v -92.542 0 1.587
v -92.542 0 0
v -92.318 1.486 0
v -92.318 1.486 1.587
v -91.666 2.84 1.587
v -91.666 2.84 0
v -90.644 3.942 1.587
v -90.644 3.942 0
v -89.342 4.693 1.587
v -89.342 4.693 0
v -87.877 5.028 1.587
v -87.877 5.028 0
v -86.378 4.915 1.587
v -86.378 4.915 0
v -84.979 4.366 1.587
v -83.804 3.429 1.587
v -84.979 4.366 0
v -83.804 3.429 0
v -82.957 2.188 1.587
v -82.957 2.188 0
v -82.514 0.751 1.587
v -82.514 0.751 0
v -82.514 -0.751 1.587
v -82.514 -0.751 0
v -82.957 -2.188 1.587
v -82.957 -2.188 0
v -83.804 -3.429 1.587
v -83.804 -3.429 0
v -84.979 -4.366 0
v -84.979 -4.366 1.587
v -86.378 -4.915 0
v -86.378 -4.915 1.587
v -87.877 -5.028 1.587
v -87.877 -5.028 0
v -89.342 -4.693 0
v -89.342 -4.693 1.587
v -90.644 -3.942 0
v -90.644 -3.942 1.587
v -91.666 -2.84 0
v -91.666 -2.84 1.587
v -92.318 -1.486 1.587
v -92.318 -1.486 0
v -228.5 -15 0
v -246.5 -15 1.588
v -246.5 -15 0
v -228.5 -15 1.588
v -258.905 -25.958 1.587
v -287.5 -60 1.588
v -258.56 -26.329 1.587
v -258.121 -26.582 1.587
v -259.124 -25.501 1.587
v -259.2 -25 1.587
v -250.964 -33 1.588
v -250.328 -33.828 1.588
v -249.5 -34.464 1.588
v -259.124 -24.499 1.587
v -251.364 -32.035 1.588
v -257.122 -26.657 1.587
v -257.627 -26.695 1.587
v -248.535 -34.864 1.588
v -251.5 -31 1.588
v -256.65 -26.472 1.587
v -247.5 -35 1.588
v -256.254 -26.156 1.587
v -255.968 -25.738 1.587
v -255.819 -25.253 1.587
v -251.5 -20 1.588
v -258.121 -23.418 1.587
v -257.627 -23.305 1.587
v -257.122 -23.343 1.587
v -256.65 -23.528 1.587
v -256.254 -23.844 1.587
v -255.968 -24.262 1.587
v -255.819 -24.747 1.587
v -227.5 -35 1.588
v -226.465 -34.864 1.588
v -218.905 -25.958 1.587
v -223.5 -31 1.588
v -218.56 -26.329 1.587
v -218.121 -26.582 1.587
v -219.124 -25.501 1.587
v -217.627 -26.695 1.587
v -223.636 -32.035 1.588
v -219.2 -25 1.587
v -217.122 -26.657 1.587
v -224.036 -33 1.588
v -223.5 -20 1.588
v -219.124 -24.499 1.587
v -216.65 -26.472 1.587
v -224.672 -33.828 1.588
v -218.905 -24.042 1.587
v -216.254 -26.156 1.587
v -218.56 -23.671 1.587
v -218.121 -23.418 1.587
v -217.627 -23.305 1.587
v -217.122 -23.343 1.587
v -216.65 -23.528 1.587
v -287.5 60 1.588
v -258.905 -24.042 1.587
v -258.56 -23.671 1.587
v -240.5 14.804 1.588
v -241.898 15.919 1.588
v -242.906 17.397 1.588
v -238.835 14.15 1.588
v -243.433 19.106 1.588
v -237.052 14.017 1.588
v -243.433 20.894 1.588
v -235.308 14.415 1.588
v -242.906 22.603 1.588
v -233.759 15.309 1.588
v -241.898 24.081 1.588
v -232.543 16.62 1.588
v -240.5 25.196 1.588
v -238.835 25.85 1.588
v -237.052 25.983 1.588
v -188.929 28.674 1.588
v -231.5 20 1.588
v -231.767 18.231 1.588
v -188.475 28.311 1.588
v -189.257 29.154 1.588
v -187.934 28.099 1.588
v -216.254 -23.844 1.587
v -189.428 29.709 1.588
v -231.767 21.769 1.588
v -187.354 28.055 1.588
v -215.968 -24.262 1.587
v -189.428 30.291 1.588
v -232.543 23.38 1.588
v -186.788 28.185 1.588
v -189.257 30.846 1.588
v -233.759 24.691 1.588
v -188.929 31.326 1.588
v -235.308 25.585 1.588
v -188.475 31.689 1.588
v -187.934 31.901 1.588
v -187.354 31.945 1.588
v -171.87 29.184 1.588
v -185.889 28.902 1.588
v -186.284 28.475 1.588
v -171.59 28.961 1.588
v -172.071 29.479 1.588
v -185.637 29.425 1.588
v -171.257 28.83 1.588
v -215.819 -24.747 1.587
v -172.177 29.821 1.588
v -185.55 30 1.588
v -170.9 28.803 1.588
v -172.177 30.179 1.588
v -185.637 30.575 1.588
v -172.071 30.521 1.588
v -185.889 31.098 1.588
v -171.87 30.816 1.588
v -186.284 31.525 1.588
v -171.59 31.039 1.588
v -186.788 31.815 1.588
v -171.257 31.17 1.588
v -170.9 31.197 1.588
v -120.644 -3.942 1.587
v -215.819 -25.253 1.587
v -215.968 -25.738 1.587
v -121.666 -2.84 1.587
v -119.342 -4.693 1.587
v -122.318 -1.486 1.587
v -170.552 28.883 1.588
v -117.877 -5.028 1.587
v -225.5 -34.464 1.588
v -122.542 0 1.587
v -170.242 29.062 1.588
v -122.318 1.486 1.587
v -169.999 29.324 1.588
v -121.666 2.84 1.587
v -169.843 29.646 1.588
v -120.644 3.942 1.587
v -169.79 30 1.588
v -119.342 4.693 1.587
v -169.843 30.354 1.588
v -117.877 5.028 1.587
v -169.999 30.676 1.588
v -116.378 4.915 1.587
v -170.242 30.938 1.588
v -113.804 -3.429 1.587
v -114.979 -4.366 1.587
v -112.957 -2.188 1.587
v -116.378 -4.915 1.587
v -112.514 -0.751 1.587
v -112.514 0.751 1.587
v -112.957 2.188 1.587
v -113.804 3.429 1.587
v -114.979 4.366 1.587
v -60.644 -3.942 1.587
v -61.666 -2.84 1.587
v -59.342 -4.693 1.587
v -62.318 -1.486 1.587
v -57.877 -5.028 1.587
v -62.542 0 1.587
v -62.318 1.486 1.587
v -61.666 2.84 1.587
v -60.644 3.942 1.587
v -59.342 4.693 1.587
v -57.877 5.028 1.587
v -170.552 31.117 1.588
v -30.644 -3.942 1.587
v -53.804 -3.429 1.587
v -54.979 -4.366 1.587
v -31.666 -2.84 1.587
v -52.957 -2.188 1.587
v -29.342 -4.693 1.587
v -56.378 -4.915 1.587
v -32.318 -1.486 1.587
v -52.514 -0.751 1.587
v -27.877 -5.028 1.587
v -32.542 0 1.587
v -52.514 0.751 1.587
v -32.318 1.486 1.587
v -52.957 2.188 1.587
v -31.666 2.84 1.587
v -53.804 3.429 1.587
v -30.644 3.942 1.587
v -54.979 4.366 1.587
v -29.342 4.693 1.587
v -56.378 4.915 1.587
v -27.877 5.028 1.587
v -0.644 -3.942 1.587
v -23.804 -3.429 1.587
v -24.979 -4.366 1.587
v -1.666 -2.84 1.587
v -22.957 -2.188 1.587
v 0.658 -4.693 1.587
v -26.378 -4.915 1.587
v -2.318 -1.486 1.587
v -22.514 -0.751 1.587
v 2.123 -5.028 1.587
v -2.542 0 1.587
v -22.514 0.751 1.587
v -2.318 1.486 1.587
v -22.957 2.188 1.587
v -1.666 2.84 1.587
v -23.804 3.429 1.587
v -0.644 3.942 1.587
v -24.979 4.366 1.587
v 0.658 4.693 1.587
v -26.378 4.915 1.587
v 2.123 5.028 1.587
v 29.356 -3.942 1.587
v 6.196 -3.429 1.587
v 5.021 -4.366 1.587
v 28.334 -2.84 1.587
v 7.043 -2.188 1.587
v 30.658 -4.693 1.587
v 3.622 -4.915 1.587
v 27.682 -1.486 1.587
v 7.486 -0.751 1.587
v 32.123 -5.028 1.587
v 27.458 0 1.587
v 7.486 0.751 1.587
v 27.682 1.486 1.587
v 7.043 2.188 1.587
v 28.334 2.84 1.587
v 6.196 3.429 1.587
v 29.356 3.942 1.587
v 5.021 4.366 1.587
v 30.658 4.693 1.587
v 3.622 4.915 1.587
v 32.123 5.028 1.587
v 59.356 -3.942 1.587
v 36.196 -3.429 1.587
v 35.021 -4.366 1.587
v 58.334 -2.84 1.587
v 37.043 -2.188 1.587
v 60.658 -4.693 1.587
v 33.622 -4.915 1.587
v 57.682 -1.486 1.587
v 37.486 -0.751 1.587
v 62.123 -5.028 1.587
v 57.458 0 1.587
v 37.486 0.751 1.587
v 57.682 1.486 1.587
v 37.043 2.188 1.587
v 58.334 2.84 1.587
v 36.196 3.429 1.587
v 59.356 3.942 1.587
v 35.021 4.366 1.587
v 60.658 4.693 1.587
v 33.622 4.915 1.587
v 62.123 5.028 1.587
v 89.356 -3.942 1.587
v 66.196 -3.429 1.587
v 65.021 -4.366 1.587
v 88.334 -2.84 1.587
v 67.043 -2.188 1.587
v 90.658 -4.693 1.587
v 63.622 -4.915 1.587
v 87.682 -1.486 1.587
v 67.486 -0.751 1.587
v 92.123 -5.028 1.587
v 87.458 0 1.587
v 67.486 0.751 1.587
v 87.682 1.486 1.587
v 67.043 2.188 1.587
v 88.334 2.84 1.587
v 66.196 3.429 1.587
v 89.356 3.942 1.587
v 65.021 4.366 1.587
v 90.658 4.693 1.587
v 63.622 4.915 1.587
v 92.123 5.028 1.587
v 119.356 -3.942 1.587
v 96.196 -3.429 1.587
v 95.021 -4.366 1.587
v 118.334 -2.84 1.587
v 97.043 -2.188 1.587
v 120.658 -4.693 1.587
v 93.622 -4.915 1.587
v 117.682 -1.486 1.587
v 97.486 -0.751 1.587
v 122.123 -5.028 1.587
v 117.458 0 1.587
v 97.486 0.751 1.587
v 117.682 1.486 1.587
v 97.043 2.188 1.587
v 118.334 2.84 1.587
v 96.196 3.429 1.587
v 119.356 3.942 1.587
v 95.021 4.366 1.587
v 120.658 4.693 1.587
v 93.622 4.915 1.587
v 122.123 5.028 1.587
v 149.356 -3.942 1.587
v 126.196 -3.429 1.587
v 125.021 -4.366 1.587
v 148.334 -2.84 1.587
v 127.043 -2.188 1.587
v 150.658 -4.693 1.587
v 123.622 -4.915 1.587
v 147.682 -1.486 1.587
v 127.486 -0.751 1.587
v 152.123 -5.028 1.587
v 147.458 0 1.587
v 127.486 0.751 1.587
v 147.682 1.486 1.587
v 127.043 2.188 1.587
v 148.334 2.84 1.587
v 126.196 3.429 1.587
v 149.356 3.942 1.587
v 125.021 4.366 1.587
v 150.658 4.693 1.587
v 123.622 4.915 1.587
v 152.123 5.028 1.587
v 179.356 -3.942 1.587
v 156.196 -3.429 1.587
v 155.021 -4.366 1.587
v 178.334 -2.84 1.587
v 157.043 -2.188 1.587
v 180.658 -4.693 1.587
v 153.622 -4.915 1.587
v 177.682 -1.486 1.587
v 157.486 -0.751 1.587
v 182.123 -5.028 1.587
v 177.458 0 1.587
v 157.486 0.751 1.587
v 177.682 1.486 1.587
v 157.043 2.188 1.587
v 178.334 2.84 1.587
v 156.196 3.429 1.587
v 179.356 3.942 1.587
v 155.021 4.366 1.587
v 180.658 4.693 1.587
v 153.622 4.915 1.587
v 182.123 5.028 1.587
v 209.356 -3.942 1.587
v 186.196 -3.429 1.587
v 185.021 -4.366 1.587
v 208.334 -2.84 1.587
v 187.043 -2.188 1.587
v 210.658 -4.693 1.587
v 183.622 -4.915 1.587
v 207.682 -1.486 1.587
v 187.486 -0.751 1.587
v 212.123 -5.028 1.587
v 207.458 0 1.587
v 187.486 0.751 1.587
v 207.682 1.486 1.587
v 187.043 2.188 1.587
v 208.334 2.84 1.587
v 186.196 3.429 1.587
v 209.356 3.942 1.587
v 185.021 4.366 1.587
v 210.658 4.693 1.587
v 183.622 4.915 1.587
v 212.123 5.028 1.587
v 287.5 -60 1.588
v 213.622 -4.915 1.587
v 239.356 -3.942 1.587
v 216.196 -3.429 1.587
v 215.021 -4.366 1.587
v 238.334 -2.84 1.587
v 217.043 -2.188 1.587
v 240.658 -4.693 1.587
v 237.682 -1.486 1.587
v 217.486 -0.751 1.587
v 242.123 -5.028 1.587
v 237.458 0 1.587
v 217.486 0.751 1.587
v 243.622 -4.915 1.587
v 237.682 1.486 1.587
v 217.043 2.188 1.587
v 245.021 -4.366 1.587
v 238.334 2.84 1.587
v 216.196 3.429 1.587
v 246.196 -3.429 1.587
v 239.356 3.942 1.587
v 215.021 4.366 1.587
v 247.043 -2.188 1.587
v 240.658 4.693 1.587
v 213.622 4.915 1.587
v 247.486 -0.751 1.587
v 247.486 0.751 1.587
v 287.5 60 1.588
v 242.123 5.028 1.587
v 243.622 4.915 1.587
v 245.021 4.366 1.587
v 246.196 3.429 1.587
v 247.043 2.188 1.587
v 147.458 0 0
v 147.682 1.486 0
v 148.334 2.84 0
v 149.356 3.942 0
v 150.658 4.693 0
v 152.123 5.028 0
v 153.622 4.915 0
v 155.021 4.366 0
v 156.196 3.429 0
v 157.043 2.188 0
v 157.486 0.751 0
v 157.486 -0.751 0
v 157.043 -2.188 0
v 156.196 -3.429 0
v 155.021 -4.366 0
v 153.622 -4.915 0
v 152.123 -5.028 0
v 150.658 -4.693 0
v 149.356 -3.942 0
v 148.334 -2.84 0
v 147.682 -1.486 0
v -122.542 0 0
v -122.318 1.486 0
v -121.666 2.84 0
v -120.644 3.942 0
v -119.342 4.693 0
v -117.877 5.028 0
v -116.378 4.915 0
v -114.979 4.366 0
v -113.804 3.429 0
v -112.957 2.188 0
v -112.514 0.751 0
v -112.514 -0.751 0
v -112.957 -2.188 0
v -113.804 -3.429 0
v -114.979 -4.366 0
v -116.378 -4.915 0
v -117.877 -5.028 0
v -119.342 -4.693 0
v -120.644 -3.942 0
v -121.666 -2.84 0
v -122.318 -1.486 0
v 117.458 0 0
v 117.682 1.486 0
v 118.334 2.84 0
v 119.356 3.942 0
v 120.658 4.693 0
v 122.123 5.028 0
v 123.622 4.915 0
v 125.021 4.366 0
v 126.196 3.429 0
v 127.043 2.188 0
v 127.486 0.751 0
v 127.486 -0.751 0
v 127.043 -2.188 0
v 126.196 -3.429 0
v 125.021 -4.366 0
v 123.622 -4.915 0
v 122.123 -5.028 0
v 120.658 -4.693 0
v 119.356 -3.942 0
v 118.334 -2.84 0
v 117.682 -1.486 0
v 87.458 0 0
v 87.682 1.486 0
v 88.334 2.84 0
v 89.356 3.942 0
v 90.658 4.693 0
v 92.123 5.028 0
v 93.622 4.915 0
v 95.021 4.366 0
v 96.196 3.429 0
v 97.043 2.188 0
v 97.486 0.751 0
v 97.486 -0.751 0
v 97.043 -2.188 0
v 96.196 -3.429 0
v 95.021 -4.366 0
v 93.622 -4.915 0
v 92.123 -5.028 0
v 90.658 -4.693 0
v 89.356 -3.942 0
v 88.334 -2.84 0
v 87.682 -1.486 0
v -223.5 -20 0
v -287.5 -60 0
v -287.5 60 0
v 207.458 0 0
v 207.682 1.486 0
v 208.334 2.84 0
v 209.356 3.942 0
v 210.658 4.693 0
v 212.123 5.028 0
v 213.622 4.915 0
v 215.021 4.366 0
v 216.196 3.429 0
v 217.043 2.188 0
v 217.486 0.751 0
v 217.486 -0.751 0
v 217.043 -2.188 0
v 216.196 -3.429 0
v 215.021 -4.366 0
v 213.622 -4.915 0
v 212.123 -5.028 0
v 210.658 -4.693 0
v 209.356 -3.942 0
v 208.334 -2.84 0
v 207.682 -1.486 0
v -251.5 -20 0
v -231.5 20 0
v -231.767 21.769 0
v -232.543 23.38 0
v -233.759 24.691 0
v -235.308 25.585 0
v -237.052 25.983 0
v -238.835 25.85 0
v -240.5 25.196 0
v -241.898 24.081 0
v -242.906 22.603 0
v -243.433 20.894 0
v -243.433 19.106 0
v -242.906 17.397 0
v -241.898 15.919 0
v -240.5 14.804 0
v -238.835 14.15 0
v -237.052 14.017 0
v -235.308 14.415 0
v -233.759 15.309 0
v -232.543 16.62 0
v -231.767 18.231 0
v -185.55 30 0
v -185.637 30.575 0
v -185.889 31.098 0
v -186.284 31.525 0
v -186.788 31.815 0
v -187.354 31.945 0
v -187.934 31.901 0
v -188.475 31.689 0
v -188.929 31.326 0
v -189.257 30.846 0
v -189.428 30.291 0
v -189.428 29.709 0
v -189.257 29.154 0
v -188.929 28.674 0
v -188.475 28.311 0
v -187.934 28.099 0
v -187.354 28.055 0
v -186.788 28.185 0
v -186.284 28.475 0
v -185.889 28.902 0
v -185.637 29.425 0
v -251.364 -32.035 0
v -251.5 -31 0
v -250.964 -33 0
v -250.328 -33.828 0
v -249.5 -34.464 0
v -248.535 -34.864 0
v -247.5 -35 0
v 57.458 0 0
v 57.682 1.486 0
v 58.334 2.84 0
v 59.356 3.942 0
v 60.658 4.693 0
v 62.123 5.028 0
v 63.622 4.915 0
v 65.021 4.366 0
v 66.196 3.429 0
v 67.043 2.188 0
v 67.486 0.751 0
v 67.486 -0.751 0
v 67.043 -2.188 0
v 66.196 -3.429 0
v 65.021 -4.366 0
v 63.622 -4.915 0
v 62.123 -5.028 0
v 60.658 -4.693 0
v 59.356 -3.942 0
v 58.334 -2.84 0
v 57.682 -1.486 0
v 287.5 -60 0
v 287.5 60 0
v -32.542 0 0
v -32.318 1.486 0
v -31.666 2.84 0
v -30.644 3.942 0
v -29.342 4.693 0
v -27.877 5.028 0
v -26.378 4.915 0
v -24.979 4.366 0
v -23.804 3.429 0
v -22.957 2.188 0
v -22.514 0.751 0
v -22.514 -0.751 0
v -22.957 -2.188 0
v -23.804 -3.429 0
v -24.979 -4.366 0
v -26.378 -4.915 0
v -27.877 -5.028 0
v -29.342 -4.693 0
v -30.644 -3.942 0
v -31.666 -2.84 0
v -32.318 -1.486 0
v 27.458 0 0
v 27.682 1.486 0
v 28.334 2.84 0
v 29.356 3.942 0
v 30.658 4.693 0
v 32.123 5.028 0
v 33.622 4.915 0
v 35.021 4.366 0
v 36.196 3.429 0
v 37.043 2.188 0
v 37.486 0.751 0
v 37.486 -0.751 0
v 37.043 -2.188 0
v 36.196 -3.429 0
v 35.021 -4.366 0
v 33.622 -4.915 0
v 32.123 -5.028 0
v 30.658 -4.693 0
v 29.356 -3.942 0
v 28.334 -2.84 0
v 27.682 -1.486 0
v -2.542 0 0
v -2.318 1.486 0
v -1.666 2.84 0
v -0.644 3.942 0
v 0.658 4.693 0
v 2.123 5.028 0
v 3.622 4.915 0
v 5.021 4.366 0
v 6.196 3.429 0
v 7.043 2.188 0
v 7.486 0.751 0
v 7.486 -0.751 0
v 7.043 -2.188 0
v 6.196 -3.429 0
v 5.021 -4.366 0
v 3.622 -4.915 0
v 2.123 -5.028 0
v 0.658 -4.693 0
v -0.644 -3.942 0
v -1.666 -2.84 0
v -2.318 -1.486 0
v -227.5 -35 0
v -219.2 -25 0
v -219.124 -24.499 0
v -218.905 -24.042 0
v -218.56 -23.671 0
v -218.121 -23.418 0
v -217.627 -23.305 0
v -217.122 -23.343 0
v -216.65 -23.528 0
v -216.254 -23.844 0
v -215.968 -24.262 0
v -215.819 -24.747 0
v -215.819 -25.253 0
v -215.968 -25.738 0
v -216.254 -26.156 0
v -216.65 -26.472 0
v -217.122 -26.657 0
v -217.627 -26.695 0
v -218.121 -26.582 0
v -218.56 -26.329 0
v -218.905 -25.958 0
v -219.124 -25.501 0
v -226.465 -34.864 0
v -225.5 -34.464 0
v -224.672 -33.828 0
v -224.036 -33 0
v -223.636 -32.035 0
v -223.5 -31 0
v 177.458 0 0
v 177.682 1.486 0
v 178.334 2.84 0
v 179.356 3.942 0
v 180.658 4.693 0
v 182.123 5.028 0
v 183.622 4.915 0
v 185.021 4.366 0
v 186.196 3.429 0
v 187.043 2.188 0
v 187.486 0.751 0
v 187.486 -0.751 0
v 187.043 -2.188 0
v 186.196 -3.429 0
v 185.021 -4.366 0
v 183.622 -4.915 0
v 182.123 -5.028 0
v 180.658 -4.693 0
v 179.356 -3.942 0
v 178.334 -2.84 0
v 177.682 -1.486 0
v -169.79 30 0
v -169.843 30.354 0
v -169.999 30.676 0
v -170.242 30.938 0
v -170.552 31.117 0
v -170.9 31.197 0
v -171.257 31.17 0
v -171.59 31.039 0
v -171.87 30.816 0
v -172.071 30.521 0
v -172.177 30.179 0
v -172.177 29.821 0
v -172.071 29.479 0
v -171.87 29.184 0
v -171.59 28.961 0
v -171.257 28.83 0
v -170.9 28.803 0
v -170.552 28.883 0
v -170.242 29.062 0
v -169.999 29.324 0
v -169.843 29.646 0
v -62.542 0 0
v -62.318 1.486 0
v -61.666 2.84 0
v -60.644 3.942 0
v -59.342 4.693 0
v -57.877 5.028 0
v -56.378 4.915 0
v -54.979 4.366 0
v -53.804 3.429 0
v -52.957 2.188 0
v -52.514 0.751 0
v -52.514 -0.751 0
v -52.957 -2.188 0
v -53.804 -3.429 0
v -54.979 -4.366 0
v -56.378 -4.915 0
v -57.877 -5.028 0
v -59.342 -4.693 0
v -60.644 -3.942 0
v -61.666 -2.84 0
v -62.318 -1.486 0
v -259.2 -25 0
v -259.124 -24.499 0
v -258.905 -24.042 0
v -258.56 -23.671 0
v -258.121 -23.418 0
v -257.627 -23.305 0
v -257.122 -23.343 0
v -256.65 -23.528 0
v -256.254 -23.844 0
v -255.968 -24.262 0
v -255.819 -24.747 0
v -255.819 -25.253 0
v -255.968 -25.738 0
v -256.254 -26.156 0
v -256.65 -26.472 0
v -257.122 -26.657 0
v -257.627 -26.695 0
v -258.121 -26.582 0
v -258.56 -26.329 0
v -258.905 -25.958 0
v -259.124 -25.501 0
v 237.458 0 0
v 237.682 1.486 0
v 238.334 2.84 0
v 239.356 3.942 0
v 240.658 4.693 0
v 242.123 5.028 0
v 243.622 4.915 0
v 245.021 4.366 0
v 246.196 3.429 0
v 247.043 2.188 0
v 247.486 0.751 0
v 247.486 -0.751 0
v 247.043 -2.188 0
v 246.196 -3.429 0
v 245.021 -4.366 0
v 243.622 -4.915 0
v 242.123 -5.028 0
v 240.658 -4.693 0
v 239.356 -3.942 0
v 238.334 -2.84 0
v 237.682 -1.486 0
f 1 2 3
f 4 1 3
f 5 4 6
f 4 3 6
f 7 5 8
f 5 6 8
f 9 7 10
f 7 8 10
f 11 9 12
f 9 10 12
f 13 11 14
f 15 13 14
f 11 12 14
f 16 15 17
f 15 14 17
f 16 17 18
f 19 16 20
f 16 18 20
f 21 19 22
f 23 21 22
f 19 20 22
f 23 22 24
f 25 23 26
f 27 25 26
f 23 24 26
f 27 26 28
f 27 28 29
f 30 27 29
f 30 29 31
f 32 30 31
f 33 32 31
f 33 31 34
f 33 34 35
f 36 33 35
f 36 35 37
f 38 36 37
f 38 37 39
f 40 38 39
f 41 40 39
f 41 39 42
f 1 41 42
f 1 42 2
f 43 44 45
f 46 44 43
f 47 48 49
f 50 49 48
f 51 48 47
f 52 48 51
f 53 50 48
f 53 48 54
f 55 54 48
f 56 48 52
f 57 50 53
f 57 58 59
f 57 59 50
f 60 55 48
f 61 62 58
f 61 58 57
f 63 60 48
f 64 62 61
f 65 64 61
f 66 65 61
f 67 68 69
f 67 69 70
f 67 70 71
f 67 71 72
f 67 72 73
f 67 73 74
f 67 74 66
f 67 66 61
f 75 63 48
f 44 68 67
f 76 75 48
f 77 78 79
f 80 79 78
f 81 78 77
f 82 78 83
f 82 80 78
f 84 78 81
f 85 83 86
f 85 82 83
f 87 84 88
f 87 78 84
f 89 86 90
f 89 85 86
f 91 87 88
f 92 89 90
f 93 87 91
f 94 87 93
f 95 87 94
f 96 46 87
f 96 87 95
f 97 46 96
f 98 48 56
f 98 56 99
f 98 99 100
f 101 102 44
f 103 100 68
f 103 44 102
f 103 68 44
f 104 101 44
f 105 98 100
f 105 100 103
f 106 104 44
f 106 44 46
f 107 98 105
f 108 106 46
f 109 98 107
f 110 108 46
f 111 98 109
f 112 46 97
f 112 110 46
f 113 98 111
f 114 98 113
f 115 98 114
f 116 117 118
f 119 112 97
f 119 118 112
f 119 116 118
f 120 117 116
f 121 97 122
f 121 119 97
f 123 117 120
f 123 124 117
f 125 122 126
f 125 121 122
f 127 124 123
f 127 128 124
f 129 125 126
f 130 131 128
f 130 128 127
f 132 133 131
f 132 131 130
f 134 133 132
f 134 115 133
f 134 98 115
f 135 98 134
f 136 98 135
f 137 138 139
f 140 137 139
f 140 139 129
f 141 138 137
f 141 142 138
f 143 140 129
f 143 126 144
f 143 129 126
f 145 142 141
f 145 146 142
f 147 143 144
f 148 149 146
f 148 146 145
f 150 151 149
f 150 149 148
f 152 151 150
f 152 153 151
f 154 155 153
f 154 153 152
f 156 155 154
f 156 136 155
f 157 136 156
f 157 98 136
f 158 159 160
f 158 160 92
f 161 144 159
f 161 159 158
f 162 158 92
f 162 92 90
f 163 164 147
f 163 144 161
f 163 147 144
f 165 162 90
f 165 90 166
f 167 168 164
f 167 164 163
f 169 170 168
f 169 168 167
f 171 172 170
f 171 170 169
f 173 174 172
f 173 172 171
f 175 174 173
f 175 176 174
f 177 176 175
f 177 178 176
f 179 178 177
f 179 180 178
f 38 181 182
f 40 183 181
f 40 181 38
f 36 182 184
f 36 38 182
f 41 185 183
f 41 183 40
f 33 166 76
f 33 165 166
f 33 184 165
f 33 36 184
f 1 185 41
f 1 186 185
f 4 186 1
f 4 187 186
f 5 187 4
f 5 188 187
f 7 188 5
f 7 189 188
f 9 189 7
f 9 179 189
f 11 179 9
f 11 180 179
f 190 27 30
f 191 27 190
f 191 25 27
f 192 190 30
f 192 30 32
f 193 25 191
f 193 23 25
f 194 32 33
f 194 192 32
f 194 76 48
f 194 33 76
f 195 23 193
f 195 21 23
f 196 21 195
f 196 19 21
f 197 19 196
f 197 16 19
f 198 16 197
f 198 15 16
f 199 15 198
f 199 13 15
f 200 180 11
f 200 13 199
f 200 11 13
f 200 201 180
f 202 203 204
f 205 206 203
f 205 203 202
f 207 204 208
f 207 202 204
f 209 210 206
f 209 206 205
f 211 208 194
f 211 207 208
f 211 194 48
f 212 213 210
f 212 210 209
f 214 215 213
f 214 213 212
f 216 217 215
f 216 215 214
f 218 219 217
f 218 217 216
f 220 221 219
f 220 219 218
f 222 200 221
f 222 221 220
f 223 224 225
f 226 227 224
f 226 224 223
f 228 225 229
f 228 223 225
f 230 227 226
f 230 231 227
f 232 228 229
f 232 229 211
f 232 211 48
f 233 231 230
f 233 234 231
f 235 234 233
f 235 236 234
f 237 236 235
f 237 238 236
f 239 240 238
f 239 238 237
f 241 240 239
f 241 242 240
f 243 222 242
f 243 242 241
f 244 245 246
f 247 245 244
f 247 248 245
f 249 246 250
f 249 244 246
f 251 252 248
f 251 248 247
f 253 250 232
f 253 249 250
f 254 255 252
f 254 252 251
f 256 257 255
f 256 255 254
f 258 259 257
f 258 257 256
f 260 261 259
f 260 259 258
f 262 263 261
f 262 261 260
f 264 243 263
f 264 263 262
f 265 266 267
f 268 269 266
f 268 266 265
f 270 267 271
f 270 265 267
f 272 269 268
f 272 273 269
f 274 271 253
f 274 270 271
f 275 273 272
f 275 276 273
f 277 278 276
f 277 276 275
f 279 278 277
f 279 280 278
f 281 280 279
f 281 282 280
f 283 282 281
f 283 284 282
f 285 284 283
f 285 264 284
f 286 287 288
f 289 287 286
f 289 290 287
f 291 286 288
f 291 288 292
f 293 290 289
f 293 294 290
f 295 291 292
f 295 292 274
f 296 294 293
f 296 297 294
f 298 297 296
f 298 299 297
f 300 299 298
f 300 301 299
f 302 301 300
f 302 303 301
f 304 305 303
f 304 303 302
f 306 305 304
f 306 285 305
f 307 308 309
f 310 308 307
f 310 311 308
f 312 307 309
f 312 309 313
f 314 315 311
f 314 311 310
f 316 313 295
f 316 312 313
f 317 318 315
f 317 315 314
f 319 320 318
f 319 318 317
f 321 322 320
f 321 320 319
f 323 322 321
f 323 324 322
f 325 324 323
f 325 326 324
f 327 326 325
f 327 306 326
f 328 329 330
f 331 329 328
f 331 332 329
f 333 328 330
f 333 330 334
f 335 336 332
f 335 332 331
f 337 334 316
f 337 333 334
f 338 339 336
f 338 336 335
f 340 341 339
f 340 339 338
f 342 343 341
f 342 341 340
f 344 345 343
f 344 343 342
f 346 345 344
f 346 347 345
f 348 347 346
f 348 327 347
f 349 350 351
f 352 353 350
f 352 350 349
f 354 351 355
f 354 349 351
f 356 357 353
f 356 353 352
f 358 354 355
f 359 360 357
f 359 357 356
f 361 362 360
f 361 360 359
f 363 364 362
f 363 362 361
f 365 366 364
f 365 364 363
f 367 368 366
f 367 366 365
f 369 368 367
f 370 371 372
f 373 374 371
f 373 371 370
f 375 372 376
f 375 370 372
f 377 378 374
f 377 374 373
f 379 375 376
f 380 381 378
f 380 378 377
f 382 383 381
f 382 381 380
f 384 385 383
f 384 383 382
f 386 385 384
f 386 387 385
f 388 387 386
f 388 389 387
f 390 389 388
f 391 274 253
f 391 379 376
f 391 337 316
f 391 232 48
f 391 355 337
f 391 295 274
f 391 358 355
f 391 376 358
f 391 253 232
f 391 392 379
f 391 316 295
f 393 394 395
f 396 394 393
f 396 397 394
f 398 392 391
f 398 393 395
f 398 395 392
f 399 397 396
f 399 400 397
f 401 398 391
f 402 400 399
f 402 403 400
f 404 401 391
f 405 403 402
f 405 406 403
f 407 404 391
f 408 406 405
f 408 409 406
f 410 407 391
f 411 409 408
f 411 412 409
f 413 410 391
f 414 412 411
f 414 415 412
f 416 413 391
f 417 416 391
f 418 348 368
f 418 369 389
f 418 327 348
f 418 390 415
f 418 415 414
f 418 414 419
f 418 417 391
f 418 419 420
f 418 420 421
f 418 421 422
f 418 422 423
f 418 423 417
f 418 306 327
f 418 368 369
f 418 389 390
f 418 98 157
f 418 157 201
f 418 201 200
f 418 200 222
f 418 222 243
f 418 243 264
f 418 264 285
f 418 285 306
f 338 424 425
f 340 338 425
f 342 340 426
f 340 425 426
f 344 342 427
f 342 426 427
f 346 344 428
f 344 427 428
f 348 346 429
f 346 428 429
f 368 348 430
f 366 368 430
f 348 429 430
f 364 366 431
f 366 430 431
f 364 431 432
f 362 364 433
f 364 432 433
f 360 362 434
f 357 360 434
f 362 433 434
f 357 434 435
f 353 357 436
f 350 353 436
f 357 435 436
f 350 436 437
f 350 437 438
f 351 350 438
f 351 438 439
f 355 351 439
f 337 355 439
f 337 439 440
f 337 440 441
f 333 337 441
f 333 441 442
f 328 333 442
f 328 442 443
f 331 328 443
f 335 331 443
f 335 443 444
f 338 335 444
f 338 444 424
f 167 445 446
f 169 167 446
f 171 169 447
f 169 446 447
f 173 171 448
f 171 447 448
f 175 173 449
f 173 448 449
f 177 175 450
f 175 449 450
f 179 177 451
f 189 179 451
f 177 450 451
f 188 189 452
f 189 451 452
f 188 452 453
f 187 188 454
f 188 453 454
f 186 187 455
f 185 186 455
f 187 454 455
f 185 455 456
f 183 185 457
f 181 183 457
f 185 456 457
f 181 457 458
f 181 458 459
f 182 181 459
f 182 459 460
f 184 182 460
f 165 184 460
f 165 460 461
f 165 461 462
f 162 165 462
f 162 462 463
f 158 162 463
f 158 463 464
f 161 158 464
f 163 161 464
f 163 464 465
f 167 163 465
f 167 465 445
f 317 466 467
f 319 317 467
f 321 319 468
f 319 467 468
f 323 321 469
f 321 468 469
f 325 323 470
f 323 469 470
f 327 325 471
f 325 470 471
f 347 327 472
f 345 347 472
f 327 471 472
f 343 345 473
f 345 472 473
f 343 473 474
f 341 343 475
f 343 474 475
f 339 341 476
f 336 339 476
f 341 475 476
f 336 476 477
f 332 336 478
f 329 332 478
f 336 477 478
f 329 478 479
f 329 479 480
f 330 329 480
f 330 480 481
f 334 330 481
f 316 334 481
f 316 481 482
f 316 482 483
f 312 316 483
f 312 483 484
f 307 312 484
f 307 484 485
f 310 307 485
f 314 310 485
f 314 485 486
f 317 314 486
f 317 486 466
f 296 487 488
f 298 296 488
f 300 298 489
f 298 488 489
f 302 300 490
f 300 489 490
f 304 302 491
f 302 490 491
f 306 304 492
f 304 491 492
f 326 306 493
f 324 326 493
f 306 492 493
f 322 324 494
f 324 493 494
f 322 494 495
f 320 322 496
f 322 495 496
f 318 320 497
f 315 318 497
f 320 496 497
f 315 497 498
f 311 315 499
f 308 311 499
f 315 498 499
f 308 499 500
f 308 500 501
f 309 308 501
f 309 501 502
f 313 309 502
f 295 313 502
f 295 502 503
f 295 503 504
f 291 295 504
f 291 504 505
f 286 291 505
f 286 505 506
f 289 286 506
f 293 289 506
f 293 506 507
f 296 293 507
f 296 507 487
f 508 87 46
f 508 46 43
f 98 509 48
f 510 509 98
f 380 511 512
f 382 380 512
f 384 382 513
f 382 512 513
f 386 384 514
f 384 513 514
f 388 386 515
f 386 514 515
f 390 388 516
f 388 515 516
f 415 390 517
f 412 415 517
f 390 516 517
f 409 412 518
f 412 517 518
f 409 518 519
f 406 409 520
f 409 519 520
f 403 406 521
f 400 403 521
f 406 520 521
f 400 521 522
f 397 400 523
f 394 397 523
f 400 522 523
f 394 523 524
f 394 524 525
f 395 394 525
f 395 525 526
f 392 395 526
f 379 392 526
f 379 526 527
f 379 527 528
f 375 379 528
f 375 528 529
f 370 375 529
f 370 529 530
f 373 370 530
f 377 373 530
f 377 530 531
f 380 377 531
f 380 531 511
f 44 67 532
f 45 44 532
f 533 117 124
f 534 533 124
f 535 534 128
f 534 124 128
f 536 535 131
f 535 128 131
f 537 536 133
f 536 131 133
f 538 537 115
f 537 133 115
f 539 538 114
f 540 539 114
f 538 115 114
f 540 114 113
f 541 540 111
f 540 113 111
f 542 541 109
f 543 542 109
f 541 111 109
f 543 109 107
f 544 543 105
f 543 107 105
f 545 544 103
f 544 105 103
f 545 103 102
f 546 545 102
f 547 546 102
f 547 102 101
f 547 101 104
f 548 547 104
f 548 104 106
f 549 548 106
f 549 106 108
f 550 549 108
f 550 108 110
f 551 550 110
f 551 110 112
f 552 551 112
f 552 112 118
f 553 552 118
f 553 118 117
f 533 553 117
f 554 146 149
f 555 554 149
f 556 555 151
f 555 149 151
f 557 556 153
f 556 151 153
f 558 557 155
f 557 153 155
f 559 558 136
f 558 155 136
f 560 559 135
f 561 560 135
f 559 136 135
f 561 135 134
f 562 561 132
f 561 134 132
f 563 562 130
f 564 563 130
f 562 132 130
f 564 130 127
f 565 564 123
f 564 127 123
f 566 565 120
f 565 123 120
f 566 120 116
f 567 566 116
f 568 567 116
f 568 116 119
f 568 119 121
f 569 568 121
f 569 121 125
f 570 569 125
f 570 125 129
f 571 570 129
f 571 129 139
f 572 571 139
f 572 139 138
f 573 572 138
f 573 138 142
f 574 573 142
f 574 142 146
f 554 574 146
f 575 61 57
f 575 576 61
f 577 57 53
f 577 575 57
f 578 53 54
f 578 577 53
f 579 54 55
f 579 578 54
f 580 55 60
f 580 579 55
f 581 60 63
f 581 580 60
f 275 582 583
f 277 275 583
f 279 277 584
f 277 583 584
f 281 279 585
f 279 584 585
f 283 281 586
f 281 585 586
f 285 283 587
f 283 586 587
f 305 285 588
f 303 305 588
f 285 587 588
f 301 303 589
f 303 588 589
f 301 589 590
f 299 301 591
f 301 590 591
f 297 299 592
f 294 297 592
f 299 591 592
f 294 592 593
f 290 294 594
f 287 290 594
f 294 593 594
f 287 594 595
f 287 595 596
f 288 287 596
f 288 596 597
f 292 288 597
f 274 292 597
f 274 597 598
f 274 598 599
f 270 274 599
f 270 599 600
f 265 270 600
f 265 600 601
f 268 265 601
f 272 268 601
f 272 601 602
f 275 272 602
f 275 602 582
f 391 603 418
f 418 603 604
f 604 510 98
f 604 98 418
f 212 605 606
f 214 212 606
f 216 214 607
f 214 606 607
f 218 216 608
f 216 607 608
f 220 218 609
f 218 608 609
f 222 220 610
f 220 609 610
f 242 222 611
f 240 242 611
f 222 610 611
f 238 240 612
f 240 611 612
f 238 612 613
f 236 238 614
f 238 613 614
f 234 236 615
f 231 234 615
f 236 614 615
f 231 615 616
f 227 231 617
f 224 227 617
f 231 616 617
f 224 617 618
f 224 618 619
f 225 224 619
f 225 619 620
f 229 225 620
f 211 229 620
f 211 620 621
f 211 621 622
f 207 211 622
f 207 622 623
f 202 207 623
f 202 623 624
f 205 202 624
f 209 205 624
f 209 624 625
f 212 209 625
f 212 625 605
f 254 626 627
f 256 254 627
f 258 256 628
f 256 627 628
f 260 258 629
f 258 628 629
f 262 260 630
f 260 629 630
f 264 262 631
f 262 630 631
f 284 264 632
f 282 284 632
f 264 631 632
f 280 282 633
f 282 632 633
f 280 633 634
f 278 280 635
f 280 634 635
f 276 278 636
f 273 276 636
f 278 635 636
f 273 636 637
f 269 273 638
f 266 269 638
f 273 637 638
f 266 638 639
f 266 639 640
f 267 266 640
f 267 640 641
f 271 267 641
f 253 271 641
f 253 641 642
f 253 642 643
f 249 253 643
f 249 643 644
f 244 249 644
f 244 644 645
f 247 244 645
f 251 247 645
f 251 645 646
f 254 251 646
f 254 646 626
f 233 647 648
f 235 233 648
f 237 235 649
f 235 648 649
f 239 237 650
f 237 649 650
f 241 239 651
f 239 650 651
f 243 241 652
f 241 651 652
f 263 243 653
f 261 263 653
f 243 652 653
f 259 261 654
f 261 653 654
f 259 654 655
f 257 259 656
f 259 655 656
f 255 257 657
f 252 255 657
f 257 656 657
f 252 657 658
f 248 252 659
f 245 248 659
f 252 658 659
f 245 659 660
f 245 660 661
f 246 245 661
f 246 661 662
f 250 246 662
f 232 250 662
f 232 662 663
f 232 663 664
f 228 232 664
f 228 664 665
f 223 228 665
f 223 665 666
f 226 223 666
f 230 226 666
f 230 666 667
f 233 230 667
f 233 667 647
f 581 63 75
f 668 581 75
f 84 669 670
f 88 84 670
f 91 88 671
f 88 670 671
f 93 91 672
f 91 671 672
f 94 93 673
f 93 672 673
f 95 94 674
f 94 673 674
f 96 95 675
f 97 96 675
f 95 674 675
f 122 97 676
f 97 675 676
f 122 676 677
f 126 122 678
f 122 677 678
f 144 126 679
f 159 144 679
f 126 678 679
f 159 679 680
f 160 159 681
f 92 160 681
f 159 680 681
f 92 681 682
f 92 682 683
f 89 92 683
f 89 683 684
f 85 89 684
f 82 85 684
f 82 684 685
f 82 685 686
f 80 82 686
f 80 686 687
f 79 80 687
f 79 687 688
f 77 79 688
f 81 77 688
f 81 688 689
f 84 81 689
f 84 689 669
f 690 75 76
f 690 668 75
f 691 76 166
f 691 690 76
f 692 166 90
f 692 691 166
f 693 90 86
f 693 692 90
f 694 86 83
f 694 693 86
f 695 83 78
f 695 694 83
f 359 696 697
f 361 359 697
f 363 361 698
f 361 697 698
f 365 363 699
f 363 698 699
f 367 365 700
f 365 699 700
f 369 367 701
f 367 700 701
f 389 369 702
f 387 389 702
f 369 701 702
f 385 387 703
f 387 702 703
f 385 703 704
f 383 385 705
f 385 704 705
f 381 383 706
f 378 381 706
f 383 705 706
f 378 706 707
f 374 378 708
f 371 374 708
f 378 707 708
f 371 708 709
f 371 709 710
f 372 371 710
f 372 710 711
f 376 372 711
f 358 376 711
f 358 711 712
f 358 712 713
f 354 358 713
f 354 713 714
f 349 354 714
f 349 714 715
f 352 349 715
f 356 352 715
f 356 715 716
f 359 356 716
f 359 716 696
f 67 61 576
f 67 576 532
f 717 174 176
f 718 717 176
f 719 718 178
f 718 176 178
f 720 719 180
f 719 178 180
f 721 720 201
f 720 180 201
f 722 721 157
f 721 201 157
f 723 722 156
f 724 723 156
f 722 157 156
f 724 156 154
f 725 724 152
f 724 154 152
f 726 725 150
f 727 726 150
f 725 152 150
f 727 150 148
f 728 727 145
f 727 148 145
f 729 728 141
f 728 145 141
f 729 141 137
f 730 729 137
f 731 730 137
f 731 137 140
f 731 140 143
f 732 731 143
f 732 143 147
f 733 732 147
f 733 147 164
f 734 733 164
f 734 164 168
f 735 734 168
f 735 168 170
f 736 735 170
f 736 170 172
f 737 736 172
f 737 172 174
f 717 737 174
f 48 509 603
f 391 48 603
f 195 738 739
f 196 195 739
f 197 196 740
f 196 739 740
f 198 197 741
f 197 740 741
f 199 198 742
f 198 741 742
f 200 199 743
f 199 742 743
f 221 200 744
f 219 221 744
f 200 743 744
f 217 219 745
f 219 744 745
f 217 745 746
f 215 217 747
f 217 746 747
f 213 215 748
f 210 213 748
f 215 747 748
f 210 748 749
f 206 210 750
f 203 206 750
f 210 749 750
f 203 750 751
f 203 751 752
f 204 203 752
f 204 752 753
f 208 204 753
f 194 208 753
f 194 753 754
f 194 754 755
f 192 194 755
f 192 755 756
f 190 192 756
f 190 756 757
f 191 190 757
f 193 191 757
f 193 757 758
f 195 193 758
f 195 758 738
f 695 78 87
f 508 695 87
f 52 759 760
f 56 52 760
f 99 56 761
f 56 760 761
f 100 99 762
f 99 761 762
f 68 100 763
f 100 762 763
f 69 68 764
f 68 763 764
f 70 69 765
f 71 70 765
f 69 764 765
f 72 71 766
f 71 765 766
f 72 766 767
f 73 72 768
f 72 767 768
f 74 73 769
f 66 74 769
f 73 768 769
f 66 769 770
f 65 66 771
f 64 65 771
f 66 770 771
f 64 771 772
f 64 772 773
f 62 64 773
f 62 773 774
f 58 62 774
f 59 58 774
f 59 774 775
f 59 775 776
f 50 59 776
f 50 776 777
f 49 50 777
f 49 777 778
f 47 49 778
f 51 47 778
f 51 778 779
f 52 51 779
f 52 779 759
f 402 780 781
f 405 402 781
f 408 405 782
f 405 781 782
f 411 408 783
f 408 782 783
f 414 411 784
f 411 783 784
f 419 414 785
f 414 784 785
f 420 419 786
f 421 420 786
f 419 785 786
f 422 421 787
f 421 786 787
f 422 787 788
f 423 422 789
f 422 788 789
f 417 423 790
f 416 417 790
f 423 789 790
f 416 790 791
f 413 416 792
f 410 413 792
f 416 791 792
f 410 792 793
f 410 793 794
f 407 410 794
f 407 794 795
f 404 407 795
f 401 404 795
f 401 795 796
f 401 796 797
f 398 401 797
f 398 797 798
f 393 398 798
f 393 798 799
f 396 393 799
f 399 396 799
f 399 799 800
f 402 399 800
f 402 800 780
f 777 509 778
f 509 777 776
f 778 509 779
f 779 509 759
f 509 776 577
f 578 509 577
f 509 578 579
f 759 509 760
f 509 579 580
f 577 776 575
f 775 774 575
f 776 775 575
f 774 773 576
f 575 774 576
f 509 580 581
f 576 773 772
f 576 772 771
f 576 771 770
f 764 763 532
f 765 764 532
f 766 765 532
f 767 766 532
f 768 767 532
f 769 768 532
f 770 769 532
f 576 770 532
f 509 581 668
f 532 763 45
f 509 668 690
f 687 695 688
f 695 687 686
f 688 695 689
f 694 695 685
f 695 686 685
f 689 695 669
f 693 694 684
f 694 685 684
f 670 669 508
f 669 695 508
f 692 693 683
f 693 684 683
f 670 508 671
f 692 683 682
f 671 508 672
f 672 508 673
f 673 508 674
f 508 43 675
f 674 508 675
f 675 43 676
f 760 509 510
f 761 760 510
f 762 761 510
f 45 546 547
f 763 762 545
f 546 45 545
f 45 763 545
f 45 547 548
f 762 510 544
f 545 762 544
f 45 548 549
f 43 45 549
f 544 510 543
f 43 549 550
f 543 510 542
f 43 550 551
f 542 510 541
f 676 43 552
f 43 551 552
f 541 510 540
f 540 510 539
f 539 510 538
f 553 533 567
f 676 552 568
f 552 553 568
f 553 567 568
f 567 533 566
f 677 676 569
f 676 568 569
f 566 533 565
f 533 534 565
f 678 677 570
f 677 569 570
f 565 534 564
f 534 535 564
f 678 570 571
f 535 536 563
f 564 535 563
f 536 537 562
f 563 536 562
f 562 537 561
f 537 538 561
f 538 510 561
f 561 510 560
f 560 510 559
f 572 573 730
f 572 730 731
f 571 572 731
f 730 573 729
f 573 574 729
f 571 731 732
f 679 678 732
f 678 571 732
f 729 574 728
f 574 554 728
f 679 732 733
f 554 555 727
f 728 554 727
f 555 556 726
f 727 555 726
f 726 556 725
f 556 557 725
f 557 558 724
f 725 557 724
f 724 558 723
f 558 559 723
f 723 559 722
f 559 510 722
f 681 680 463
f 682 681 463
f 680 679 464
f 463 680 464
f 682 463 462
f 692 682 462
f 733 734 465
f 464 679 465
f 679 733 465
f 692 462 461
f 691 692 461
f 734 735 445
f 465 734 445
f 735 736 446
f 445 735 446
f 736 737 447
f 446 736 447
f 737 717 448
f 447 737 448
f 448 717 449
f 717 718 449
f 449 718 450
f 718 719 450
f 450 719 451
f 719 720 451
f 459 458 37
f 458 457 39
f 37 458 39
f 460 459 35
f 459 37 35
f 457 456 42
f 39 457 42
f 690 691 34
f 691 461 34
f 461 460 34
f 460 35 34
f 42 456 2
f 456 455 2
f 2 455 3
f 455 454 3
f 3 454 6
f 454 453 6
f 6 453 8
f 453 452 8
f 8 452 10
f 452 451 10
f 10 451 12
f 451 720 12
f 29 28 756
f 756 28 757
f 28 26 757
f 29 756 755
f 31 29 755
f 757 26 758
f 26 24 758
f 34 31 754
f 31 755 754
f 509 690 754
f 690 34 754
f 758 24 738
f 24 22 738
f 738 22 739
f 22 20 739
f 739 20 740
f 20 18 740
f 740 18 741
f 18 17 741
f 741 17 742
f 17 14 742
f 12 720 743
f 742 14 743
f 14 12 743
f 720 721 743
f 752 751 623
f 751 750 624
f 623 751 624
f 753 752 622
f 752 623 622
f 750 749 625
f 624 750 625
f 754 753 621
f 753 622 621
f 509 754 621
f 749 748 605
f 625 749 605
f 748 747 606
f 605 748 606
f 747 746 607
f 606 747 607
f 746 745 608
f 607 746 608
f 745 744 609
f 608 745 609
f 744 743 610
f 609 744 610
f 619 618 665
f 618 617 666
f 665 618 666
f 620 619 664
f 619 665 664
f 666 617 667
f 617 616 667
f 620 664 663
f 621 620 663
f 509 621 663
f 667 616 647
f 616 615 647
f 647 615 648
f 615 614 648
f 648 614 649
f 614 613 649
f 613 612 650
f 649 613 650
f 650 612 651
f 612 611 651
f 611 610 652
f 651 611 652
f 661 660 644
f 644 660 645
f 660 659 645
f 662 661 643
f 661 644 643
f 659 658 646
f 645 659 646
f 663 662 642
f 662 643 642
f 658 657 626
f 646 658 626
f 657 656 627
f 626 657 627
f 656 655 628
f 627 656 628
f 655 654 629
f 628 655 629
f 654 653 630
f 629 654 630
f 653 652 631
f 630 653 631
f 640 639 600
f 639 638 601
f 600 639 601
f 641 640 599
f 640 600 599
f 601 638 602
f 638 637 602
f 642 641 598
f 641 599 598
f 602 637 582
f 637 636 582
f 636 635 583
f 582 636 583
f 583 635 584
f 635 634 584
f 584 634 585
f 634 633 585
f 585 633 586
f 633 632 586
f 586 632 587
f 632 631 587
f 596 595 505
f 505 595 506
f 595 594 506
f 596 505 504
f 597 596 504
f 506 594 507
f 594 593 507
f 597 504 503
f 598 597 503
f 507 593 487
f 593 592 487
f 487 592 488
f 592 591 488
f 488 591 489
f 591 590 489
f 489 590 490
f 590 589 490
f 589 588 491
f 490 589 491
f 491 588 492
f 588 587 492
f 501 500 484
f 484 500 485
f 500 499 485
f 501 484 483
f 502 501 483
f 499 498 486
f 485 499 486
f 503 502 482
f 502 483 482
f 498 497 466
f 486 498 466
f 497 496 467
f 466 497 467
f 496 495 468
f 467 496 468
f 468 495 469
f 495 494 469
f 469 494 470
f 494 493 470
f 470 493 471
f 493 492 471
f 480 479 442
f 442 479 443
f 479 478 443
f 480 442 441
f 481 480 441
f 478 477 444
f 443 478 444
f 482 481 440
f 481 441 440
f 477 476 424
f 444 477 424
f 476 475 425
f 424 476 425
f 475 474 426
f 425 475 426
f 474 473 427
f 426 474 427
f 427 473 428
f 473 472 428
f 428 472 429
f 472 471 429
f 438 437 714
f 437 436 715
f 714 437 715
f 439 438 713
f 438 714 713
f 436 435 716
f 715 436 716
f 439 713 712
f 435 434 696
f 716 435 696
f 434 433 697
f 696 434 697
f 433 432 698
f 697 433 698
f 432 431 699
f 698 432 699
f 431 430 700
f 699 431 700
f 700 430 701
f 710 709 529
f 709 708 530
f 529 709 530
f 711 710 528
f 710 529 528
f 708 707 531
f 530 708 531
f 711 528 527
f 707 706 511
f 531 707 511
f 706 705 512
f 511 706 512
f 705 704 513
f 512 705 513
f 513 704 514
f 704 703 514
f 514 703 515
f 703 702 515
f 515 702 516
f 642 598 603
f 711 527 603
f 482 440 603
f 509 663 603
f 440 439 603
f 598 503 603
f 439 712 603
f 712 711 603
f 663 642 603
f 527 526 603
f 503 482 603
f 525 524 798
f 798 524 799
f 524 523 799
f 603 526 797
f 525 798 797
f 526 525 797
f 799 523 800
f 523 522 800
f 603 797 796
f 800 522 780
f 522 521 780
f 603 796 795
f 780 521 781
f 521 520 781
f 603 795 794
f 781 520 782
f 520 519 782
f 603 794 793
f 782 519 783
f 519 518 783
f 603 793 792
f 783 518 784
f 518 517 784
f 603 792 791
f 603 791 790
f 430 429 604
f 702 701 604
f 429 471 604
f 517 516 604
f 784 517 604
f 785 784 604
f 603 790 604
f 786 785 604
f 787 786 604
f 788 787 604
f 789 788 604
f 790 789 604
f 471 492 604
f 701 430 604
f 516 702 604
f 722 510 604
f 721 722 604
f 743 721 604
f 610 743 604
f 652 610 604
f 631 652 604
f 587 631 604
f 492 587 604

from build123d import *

# Parameters (mm, degrees)
SKETCH1_W               = 575
SKETCH1_H               = 120
BOSS_EXTRUDE1_DEPTH     = 1.5875
M3_CLEARANCE_HOLE1_D    = 3.4
F_3_8_CLEARANCE_HOLE1_D = 10.0838
LPATTERN1_COUNT         = 13
LPATTERN1_PITCH         = 30
CUT_EXTRUDE1_REACH      = 295.698
SKETCH8_R               = 1.95
SKETCH8_R_2             = 1.2
CUT_EXTRUDE2_REACH      = 295.698
SKETCH9_W               = 28
SKETCH9_H               = 20
FILLET1_R               = 4
CHAMFER1_SIZE           = 5
CUT_EXTRUDE3_REACH      = 295.698
SKETCH10_R              = 6


with BuildPart() as part:
    # Sketch1 → Boss-Extrude1 (new body)
    with BuildSketch(Plane.XY):
        Rectangle(SKETCH1_W, SKETCH1_H)
    extrude(amount=BOSS_EXTRUDE1_DEPTH)

    # M3 Clearance Hole1 (through all)
    with Locations(Plane.XY.offset(1.5875)):
        with Locations((-257.5, -25), (-217.5, -25)):
            Hole(M3_CLEARANCE_HOLE1_D / 2)

    # 3/8 Clearance Hole1 (through all)
    with Locations(Plane.XY.offset(1.5875)):
        with Locations((-117.5, 0)):
            f_3_8_clearance_hole1 = Hole(F_3_8_CLEARANCE_HOLE1_D / 2)

    # LPattern1: 3/8 Clearance Hole1 ×13
    with Locations(*[(i * LPATTERN1_PITCH, 0, 0) for i in range(1, LPATTERN1_COUNT)]):
        add(f_3_8_clearance_hole1, mode=Mode.SUBTRACT)

    # Sketch8 → Cut-Extrude1 (cut, up to next)
    with BuildSketch(Plane.XY.offset(1.5875), mode=Mode.PRIVATE) as cut_extrude1_sk1:
        with Locations((-187.5, 30)):
            Circle(SKETCH8_R)
    cut_extrude1_tool1 = extrude(cut_extrude1_sk1.sketch, amount=-CUT_EXTRUDE1_REACH, mode=Mode.PRIVATE) & part.part
    # Sketch8 → Cut-Extrude1 (cut, up to next)
    with BuildSketch(Plane.XY.offset(1.5875), mode=Mode.PRIVATE) as cut_extrude1_sk2:
        with Locations((-170.99, 30)):
            Circle(SKETCH8_R_2)
    cut_extrude1_tool2 = extrude(cut_extrude1_sk2.sketch, amount=-CUT_EXTRUDE1_REACH, mode=Mode.PRIVATE) & part.part
    add(cut_extrude1_tool1.solids().sort_by_distance((-187.5, 30, 1.5875))[0], mode=Mode.SUBTRACT)
    add(cut_extrude1_tool2.solids().sort_by_distance((-170.99, 30, 1.5875))[0], mode=Mode.SUBTRACT)

    # Sketch9 → Cut-Extrude2 (cut, up to next)
    with BuildSketch(Plane.XY.offset(1.5875), mode=Mode.PRIVATE) as cut_extrude2_sk1:
        with Locations((-237.5, -25)):
            Rectangle(SKETCH9_W, SKETCH9_H)
    cut_extrude2_tool1 = extrude(cut_extrude2_sk1.sketch, amount=-CUT_EXTRUDE2_REACH, mode=Mode.PRIVATE) & part.part
    add(cut_extrude2_tool1.solids().sort_by_distance((-237.5, -25, 1.5875))[0], mode=Mode.SUBTRACT)

    # Fillet1
    fillet1_edges = [part.edges().sort_by_distance(p)[0] for p in [
        (-251.5, -35, 0.79375),
        (-223.5, -35, 0.79375),
    ]]
    fillet(fillet1_edges, radius=FILLET1_R)

    # Chamfer1
    chamfer1_edges = [part.edges().sort_by_distance(p)[0] for p in [
        (-251.5, -15, 0.79375),
        (-223.5, -15, 0.79375),
    ]]
    chamfer(chamfer1_edges, length=CHAMFER1_SIZE)

    # Sketch10 → Cut-Extrude3 (cut, up to next)
    with BuildSketch(Plane.XY.offset(1.5875), mode=Mode.PRIVATE) as cut_extrude3_sk1:
        with Locations((-237.5, 20)):
            Circle(SKETCH10_R)
    cut_extrude3_tool1 = extrude(cut_extrude3_sk1.sketch, amount=-CUT_EXTRUDE3_REACH, mode=Mode.PRIVATE) & part.part
    add(cut_extrude3_tool1.solids().sort_by_distance((-237.5, 20, 1.5875))[0], mode=Mode.SUBTRACT)


solid = part.part
